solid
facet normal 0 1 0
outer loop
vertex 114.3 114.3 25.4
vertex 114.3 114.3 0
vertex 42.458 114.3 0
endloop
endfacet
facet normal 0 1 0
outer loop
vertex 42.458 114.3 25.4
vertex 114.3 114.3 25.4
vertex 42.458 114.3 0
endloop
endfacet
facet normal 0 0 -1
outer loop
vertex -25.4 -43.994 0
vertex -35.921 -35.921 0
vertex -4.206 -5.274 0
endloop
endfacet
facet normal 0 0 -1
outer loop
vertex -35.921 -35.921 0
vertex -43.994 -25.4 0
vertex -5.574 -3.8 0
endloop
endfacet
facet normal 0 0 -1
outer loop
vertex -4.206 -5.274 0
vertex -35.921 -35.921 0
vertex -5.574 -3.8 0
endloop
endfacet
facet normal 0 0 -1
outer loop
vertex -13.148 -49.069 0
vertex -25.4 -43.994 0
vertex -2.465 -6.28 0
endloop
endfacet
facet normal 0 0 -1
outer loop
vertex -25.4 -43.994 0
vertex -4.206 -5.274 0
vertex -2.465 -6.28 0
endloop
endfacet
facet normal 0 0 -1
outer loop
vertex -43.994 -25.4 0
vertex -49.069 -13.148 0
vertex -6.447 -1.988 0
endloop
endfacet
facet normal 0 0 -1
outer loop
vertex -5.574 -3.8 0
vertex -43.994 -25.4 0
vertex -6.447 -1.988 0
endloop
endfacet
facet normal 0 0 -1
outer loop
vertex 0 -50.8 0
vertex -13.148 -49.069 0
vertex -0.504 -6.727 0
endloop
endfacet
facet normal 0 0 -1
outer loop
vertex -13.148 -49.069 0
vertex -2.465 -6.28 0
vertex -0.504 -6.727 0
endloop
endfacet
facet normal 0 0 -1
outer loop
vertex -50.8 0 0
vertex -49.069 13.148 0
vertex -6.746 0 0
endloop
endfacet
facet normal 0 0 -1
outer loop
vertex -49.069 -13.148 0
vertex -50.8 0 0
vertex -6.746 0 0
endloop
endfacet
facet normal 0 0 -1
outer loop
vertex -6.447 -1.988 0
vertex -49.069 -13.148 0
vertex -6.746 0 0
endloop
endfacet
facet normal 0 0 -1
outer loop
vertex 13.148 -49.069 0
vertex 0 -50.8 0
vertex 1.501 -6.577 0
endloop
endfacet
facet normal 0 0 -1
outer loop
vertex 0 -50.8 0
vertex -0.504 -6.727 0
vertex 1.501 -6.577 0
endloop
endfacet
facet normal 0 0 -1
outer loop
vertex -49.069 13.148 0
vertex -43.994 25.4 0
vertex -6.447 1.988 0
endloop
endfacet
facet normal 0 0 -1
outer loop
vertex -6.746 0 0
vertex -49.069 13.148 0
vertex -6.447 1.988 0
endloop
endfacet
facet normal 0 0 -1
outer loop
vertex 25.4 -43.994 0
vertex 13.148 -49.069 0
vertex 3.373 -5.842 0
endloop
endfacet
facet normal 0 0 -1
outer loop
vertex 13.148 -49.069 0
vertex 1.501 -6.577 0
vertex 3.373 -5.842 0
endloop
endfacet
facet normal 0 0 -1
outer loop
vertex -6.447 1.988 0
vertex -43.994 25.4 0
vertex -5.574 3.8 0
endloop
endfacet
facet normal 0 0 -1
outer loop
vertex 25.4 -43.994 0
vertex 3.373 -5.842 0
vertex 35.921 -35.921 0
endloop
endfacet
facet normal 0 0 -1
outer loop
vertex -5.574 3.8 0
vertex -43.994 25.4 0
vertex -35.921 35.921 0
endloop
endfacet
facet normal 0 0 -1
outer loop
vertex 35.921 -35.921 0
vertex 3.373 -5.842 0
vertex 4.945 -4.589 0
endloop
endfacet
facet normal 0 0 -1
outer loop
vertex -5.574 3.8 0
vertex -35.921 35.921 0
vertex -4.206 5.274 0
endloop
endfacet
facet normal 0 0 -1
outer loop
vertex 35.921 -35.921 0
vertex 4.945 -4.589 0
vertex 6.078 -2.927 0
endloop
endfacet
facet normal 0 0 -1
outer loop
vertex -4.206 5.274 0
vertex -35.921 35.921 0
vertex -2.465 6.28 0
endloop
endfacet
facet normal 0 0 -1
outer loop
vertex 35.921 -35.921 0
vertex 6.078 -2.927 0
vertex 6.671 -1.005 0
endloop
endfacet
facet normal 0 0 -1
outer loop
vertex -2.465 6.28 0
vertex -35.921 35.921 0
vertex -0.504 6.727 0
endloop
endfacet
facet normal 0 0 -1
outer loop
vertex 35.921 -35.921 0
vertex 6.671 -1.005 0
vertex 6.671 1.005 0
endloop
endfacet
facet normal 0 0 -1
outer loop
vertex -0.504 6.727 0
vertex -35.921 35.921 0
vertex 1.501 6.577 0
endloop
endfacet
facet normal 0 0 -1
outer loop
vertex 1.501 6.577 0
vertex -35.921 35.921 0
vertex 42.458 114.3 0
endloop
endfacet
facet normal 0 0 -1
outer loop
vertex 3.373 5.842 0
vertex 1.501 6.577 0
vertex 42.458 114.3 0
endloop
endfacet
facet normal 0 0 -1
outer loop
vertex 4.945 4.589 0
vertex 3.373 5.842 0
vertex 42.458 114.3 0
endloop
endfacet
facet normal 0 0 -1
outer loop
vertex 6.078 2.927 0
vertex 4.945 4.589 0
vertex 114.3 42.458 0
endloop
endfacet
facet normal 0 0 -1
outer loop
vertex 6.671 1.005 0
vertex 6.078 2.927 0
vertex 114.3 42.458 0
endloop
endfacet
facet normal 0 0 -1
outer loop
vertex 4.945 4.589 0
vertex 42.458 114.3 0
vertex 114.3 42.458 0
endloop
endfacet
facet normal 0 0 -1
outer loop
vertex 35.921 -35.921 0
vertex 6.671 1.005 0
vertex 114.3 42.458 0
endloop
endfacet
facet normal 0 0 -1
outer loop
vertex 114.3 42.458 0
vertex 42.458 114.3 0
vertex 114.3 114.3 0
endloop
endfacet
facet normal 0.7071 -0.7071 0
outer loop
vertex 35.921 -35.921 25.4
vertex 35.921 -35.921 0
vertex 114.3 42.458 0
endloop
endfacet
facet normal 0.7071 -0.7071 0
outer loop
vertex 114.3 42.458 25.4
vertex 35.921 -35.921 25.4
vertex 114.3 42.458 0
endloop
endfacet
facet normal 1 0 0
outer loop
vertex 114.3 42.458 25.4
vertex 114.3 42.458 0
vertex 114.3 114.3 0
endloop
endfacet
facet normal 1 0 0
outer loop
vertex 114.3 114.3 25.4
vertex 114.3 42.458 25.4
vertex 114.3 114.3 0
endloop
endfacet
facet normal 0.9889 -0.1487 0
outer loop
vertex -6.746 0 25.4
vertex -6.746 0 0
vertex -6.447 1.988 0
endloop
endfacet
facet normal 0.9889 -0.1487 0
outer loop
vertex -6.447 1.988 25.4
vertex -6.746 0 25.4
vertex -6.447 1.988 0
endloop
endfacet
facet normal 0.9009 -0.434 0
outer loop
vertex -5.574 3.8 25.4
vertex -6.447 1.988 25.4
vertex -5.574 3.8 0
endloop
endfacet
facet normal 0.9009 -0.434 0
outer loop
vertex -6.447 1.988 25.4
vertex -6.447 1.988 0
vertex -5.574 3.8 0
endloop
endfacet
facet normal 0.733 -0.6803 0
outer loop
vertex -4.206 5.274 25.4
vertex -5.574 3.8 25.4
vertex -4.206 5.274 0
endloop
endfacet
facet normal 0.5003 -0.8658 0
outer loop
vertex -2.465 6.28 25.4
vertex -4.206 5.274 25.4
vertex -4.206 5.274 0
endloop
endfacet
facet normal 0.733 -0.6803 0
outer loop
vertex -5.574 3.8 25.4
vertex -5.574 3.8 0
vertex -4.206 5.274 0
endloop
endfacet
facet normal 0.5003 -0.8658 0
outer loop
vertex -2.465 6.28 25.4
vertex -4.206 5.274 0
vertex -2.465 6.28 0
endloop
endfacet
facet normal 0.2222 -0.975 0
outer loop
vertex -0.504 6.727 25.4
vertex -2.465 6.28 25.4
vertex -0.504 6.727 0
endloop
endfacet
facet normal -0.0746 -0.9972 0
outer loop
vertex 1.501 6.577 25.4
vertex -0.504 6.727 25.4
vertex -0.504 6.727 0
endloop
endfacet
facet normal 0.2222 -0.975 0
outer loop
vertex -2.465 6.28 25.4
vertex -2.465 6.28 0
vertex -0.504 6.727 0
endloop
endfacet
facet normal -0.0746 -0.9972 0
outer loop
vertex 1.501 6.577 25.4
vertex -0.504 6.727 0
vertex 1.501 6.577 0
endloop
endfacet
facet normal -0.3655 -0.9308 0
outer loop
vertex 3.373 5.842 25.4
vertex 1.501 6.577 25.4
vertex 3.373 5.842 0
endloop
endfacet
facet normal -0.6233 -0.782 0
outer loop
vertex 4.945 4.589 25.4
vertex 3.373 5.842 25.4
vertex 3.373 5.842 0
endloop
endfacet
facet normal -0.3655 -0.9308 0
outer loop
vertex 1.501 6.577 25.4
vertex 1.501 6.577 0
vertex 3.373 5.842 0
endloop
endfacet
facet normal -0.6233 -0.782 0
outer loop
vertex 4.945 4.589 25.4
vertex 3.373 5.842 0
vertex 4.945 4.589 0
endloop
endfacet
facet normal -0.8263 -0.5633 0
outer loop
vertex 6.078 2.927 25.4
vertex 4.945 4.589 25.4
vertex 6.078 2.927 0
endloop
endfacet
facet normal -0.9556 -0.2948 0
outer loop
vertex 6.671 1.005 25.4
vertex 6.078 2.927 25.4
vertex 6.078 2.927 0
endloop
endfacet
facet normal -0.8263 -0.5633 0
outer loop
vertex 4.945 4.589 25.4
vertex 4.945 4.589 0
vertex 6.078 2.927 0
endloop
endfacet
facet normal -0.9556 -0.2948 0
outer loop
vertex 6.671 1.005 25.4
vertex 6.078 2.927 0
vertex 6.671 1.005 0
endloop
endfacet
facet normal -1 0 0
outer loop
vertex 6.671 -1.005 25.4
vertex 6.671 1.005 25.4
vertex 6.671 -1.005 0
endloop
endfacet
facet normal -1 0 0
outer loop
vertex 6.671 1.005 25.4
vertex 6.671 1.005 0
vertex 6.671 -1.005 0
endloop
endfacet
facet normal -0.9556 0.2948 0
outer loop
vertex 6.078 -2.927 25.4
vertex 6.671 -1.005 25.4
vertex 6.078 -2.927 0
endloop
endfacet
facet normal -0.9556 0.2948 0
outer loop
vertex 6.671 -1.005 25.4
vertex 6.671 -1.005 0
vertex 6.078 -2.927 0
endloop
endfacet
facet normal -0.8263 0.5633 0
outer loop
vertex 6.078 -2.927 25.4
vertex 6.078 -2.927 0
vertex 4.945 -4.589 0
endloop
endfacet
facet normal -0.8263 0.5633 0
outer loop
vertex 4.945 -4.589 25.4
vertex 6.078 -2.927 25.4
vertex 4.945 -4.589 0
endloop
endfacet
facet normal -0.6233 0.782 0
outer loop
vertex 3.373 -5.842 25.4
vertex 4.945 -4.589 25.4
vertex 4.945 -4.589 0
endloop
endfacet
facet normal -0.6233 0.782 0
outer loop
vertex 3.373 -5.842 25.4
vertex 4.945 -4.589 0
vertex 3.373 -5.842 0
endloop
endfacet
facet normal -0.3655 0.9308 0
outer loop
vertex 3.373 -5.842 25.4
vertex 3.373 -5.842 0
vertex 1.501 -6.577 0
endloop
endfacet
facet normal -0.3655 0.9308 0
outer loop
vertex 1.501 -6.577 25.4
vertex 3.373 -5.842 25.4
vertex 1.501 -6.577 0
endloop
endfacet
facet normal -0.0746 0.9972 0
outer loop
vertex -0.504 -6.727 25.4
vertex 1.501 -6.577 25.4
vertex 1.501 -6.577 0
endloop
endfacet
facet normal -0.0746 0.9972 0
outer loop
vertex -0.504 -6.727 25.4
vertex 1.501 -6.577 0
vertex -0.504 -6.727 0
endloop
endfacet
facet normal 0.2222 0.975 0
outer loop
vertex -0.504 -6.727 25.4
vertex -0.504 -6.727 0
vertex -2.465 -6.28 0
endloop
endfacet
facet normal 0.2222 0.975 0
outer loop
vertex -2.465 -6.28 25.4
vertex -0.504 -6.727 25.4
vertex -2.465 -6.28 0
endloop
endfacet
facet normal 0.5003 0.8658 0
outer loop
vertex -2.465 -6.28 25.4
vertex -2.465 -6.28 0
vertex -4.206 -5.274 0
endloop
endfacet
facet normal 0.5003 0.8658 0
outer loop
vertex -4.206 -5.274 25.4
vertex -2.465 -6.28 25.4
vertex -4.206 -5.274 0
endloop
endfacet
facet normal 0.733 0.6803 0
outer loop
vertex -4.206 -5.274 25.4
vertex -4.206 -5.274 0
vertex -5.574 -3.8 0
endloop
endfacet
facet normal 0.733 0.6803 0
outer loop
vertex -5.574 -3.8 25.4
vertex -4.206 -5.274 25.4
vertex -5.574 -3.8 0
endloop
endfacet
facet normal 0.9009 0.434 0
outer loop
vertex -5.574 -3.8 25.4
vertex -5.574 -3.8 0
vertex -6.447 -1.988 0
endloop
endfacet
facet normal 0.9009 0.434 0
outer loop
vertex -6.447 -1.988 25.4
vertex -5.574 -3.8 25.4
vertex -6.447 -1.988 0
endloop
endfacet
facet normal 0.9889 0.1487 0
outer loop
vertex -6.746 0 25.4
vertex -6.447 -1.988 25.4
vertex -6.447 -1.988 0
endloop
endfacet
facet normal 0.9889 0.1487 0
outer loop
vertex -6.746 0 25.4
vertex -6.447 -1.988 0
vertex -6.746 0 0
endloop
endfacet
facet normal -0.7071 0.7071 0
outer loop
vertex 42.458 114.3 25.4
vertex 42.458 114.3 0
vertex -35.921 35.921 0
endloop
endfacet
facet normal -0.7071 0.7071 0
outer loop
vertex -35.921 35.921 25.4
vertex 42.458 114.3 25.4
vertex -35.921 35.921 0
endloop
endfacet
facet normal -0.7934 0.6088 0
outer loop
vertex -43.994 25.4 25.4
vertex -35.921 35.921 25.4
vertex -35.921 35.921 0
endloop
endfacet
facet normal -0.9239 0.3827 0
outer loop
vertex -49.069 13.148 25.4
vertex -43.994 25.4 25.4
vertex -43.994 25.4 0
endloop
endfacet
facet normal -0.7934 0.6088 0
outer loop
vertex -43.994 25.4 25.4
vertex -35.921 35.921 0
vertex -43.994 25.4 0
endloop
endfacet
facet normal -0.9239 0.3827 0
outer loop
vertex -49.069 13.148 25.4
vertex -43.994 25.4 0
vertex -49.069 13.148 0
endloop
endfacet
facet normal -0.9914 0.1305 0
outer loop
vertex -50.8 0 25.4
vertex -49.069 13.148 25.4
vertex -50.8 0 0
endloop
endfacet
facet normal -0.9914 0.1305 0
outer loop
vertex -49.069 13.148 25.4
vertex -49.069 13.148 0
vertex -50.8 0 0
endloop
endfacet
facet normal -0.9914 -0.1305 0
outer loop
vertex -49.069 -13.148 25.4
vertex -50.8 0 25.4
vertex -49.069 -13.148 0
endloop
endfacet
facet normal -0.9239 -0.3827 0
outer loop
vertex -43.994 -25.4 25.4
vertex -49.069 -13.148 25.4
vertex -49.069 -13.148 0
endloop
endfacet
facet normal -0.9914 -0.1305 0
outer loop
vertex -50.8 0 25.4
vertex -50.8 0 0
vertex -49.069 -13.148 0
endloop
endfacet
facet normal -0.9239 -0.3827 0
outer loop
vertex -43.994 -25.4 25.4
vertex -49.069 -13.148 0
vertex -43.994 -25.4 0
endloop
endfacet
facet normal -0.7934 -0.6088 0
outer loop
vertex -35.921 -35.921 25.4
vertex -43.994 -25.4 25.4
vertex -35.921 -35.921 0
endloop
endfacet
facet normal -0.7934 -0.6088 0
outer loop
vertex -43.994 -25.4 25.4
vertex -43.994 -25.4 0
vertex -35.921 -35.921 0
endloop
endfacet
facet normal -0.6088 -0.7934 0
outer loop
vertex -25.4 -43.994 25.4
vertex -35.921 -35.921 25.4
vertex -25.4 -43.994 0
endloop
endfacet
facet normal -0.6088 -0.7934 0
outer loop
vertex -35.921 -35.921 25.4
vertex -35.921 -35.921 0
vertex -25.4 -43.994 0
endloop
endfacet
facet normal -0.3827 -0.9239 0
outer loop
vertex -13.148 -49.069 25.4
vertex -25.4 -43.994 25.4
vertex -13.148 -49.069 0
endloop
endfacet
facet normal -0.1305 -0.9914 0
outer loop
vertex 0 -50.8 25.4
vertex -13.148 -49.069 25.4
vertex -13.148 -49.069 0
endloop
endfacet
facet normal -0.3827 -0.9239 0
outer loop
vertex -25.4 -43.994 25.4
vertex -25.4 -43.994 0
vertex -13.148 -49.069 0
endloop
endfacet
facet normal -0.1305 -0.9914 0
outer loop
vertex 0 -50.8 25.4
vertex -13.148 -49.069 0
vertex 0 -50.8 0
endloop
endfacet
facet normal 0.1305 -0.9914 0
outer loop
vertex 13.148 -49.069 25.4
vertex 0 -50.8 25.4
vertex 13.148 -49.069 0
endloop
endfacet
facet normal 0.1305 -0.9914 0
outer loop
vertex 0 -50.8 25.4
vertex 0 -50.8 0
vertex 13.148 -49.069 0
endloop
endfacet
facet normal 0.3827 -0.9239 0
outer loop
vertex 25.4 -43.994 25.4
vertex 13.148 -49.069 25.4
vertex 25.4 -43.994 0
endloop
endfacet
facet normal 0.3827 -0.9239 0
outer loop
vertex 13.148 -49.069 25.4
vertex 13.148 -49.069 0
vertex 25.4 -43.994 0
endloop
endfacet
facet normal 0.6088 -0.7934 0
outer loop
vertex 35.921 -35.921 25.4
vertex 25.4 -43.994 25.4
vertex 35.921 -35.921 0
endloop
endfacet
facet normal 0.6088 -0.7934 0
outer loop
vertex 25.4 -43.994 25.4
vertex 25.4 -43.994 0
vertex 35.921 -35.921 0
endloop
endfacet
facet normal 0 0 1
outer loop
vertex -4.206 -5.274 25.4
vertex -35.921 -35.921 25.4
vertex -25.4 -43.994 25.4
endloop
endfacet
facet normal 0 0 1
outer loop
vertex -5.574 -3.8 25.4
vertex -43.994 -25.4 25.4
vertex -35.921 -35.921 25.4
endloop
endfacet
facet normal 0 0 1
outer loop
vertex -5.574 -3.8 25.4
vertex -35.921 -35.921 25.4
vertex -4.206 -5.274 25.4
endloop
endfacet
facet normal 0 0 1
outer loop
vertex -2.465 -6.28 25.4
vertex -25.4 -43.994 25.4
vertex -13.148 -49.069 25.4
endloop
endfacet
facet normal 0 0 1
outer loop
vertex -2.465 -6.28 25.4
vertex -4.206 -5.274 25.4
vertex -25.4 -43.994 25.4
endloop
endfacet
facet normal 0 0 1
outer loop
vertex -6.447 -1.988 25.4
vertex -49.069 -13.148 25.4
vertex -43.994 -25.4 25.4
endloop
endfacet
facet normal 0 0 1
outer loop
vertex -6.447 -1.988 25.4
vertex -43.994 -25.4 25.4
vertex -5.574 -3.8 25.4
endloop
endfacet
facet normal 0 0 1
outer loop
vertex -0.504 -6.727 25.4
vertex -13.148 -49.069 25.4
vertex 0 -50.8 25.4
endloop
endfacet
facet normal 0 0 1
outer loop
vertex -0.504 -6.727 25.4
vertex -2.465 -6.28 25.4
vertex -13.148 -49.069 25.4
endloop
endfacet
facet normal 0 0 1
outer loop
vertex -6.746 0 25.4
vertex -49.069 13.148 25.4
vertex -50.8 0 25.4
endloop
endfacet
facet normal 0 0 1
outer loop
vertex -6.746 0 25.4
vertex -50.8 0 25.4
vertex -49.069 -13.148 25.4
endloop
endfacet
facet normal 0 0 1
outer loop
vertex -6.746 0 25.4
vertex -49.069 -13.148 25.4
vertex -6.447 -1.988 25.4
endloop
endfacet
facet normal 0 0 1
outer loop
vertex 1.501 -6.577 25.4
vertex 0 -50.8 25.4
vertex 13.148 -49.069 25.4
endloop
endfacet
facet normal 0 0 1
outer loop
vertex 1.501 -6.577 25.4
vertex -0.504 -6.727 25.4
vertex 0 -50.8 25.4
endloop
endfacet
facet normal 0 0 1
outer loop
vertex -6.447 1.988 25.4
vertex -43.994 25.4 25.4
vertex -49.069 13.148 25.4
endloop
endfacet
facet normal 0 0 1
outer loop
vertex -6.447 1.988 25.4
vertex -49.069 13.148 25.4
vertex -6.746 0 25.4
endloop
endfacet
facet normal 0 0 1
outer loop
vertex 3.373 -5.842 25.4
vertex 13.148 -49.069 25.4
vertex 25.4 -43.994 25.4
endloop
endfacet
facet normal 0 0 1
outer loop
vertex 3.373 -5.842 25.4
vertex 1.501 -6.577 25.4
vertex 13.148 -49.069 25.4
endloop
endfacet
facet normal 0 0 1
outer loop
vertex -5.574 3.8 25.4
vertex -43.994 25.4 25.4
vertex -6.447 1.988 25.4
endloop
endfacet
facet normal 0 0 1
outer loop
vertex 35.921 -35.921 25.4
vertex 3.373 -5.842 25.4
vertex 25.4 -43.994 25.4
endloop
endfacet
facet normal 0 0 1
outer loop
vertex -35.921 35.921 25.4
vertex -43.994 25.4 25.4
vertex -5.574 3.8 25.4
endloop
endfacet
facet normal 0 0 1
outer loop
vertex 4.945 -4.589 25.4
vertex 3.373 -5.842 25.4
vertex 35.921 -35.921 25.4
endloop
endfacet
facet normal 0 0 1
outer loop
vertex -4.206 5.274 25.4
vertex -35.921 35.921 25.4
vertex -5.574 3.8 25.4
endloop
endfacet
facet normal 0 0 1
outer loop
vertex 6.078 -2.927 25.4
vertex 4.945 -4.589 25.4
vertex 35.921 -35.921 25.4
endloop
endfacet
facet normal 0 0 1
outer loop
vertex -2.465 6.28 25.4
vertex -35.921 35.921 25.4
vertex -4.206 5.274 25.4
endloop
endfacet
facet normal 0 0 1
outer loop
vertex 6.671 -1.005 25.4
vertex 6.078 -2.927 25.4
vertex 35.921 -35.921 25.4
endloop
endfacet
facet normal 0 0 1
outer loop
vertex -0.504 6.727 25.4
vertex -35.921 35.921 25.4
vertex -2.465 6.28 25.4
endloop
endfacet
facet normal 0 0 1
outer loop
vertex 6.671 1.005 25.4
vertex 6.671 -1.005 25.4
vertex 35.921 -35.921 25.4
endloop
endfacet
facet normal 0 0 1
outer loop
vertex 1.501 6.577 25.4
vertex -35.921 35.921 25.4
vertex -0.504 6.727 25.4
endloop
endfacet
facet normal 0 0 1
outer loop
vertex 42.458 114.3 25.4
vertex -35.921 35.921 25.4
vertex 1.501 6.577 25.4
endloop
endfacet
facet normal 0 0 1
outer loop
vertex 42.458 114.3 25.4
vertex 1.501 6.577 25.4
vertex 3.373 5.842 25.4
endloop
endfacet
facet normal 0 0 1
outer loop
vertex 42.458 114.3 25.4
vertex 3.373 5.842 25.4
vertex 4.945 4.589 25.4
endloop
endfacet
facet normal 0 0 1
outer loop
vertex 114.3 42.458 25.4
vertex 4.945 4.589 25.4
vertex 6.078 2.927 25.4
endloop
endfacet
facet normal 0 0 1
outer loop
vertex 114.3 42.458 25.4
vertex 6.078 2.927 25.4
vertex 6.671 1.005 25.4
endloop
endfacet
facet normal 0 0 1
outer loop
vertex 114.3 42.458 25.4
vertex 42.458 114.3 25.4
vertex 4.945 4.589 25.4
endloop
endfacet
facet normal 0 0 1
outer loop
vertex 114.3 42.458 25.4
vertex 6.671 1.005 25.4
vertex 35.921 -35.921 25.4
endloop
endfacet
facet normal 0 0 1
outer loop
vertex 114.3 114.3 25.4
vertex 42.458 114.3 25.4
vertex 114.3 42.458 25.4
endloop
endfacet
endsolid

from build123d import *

# Parameters (mm, degrees)
F1_DEPTH = 25.4
F3_D     = 13.49248


with BuildPart() as f1:
    # F0 (on Top) → F1 (new body)
    with BuildSketch(Plane.XY):
        with BuildLine():
            Line((42.4579510314, 114.3), (-35.9210244843, 35.9210244843))
            ThreePointArc((-35.9210244843, 35.9210244843), (-35.9210244843, -35.9210244843), (35.9210244843, -35.9210244843))
            Line((35.9210244843, -35.9210244843), (114.3, 42.4579510314))
            Line((114.3, 42.4579510314), (114.3, 114.3))
            Line((114.3, 114.3), (42.4579510314, 114.3))
        make_face()
    extrude(amount=F1_DEPTH)

    # F3 (through all)
    with Locations(Plane.XY.offset(25.4)):
        with Locations((0, 0)):
            Hole(F3_D / 2)


solid = f1.part
